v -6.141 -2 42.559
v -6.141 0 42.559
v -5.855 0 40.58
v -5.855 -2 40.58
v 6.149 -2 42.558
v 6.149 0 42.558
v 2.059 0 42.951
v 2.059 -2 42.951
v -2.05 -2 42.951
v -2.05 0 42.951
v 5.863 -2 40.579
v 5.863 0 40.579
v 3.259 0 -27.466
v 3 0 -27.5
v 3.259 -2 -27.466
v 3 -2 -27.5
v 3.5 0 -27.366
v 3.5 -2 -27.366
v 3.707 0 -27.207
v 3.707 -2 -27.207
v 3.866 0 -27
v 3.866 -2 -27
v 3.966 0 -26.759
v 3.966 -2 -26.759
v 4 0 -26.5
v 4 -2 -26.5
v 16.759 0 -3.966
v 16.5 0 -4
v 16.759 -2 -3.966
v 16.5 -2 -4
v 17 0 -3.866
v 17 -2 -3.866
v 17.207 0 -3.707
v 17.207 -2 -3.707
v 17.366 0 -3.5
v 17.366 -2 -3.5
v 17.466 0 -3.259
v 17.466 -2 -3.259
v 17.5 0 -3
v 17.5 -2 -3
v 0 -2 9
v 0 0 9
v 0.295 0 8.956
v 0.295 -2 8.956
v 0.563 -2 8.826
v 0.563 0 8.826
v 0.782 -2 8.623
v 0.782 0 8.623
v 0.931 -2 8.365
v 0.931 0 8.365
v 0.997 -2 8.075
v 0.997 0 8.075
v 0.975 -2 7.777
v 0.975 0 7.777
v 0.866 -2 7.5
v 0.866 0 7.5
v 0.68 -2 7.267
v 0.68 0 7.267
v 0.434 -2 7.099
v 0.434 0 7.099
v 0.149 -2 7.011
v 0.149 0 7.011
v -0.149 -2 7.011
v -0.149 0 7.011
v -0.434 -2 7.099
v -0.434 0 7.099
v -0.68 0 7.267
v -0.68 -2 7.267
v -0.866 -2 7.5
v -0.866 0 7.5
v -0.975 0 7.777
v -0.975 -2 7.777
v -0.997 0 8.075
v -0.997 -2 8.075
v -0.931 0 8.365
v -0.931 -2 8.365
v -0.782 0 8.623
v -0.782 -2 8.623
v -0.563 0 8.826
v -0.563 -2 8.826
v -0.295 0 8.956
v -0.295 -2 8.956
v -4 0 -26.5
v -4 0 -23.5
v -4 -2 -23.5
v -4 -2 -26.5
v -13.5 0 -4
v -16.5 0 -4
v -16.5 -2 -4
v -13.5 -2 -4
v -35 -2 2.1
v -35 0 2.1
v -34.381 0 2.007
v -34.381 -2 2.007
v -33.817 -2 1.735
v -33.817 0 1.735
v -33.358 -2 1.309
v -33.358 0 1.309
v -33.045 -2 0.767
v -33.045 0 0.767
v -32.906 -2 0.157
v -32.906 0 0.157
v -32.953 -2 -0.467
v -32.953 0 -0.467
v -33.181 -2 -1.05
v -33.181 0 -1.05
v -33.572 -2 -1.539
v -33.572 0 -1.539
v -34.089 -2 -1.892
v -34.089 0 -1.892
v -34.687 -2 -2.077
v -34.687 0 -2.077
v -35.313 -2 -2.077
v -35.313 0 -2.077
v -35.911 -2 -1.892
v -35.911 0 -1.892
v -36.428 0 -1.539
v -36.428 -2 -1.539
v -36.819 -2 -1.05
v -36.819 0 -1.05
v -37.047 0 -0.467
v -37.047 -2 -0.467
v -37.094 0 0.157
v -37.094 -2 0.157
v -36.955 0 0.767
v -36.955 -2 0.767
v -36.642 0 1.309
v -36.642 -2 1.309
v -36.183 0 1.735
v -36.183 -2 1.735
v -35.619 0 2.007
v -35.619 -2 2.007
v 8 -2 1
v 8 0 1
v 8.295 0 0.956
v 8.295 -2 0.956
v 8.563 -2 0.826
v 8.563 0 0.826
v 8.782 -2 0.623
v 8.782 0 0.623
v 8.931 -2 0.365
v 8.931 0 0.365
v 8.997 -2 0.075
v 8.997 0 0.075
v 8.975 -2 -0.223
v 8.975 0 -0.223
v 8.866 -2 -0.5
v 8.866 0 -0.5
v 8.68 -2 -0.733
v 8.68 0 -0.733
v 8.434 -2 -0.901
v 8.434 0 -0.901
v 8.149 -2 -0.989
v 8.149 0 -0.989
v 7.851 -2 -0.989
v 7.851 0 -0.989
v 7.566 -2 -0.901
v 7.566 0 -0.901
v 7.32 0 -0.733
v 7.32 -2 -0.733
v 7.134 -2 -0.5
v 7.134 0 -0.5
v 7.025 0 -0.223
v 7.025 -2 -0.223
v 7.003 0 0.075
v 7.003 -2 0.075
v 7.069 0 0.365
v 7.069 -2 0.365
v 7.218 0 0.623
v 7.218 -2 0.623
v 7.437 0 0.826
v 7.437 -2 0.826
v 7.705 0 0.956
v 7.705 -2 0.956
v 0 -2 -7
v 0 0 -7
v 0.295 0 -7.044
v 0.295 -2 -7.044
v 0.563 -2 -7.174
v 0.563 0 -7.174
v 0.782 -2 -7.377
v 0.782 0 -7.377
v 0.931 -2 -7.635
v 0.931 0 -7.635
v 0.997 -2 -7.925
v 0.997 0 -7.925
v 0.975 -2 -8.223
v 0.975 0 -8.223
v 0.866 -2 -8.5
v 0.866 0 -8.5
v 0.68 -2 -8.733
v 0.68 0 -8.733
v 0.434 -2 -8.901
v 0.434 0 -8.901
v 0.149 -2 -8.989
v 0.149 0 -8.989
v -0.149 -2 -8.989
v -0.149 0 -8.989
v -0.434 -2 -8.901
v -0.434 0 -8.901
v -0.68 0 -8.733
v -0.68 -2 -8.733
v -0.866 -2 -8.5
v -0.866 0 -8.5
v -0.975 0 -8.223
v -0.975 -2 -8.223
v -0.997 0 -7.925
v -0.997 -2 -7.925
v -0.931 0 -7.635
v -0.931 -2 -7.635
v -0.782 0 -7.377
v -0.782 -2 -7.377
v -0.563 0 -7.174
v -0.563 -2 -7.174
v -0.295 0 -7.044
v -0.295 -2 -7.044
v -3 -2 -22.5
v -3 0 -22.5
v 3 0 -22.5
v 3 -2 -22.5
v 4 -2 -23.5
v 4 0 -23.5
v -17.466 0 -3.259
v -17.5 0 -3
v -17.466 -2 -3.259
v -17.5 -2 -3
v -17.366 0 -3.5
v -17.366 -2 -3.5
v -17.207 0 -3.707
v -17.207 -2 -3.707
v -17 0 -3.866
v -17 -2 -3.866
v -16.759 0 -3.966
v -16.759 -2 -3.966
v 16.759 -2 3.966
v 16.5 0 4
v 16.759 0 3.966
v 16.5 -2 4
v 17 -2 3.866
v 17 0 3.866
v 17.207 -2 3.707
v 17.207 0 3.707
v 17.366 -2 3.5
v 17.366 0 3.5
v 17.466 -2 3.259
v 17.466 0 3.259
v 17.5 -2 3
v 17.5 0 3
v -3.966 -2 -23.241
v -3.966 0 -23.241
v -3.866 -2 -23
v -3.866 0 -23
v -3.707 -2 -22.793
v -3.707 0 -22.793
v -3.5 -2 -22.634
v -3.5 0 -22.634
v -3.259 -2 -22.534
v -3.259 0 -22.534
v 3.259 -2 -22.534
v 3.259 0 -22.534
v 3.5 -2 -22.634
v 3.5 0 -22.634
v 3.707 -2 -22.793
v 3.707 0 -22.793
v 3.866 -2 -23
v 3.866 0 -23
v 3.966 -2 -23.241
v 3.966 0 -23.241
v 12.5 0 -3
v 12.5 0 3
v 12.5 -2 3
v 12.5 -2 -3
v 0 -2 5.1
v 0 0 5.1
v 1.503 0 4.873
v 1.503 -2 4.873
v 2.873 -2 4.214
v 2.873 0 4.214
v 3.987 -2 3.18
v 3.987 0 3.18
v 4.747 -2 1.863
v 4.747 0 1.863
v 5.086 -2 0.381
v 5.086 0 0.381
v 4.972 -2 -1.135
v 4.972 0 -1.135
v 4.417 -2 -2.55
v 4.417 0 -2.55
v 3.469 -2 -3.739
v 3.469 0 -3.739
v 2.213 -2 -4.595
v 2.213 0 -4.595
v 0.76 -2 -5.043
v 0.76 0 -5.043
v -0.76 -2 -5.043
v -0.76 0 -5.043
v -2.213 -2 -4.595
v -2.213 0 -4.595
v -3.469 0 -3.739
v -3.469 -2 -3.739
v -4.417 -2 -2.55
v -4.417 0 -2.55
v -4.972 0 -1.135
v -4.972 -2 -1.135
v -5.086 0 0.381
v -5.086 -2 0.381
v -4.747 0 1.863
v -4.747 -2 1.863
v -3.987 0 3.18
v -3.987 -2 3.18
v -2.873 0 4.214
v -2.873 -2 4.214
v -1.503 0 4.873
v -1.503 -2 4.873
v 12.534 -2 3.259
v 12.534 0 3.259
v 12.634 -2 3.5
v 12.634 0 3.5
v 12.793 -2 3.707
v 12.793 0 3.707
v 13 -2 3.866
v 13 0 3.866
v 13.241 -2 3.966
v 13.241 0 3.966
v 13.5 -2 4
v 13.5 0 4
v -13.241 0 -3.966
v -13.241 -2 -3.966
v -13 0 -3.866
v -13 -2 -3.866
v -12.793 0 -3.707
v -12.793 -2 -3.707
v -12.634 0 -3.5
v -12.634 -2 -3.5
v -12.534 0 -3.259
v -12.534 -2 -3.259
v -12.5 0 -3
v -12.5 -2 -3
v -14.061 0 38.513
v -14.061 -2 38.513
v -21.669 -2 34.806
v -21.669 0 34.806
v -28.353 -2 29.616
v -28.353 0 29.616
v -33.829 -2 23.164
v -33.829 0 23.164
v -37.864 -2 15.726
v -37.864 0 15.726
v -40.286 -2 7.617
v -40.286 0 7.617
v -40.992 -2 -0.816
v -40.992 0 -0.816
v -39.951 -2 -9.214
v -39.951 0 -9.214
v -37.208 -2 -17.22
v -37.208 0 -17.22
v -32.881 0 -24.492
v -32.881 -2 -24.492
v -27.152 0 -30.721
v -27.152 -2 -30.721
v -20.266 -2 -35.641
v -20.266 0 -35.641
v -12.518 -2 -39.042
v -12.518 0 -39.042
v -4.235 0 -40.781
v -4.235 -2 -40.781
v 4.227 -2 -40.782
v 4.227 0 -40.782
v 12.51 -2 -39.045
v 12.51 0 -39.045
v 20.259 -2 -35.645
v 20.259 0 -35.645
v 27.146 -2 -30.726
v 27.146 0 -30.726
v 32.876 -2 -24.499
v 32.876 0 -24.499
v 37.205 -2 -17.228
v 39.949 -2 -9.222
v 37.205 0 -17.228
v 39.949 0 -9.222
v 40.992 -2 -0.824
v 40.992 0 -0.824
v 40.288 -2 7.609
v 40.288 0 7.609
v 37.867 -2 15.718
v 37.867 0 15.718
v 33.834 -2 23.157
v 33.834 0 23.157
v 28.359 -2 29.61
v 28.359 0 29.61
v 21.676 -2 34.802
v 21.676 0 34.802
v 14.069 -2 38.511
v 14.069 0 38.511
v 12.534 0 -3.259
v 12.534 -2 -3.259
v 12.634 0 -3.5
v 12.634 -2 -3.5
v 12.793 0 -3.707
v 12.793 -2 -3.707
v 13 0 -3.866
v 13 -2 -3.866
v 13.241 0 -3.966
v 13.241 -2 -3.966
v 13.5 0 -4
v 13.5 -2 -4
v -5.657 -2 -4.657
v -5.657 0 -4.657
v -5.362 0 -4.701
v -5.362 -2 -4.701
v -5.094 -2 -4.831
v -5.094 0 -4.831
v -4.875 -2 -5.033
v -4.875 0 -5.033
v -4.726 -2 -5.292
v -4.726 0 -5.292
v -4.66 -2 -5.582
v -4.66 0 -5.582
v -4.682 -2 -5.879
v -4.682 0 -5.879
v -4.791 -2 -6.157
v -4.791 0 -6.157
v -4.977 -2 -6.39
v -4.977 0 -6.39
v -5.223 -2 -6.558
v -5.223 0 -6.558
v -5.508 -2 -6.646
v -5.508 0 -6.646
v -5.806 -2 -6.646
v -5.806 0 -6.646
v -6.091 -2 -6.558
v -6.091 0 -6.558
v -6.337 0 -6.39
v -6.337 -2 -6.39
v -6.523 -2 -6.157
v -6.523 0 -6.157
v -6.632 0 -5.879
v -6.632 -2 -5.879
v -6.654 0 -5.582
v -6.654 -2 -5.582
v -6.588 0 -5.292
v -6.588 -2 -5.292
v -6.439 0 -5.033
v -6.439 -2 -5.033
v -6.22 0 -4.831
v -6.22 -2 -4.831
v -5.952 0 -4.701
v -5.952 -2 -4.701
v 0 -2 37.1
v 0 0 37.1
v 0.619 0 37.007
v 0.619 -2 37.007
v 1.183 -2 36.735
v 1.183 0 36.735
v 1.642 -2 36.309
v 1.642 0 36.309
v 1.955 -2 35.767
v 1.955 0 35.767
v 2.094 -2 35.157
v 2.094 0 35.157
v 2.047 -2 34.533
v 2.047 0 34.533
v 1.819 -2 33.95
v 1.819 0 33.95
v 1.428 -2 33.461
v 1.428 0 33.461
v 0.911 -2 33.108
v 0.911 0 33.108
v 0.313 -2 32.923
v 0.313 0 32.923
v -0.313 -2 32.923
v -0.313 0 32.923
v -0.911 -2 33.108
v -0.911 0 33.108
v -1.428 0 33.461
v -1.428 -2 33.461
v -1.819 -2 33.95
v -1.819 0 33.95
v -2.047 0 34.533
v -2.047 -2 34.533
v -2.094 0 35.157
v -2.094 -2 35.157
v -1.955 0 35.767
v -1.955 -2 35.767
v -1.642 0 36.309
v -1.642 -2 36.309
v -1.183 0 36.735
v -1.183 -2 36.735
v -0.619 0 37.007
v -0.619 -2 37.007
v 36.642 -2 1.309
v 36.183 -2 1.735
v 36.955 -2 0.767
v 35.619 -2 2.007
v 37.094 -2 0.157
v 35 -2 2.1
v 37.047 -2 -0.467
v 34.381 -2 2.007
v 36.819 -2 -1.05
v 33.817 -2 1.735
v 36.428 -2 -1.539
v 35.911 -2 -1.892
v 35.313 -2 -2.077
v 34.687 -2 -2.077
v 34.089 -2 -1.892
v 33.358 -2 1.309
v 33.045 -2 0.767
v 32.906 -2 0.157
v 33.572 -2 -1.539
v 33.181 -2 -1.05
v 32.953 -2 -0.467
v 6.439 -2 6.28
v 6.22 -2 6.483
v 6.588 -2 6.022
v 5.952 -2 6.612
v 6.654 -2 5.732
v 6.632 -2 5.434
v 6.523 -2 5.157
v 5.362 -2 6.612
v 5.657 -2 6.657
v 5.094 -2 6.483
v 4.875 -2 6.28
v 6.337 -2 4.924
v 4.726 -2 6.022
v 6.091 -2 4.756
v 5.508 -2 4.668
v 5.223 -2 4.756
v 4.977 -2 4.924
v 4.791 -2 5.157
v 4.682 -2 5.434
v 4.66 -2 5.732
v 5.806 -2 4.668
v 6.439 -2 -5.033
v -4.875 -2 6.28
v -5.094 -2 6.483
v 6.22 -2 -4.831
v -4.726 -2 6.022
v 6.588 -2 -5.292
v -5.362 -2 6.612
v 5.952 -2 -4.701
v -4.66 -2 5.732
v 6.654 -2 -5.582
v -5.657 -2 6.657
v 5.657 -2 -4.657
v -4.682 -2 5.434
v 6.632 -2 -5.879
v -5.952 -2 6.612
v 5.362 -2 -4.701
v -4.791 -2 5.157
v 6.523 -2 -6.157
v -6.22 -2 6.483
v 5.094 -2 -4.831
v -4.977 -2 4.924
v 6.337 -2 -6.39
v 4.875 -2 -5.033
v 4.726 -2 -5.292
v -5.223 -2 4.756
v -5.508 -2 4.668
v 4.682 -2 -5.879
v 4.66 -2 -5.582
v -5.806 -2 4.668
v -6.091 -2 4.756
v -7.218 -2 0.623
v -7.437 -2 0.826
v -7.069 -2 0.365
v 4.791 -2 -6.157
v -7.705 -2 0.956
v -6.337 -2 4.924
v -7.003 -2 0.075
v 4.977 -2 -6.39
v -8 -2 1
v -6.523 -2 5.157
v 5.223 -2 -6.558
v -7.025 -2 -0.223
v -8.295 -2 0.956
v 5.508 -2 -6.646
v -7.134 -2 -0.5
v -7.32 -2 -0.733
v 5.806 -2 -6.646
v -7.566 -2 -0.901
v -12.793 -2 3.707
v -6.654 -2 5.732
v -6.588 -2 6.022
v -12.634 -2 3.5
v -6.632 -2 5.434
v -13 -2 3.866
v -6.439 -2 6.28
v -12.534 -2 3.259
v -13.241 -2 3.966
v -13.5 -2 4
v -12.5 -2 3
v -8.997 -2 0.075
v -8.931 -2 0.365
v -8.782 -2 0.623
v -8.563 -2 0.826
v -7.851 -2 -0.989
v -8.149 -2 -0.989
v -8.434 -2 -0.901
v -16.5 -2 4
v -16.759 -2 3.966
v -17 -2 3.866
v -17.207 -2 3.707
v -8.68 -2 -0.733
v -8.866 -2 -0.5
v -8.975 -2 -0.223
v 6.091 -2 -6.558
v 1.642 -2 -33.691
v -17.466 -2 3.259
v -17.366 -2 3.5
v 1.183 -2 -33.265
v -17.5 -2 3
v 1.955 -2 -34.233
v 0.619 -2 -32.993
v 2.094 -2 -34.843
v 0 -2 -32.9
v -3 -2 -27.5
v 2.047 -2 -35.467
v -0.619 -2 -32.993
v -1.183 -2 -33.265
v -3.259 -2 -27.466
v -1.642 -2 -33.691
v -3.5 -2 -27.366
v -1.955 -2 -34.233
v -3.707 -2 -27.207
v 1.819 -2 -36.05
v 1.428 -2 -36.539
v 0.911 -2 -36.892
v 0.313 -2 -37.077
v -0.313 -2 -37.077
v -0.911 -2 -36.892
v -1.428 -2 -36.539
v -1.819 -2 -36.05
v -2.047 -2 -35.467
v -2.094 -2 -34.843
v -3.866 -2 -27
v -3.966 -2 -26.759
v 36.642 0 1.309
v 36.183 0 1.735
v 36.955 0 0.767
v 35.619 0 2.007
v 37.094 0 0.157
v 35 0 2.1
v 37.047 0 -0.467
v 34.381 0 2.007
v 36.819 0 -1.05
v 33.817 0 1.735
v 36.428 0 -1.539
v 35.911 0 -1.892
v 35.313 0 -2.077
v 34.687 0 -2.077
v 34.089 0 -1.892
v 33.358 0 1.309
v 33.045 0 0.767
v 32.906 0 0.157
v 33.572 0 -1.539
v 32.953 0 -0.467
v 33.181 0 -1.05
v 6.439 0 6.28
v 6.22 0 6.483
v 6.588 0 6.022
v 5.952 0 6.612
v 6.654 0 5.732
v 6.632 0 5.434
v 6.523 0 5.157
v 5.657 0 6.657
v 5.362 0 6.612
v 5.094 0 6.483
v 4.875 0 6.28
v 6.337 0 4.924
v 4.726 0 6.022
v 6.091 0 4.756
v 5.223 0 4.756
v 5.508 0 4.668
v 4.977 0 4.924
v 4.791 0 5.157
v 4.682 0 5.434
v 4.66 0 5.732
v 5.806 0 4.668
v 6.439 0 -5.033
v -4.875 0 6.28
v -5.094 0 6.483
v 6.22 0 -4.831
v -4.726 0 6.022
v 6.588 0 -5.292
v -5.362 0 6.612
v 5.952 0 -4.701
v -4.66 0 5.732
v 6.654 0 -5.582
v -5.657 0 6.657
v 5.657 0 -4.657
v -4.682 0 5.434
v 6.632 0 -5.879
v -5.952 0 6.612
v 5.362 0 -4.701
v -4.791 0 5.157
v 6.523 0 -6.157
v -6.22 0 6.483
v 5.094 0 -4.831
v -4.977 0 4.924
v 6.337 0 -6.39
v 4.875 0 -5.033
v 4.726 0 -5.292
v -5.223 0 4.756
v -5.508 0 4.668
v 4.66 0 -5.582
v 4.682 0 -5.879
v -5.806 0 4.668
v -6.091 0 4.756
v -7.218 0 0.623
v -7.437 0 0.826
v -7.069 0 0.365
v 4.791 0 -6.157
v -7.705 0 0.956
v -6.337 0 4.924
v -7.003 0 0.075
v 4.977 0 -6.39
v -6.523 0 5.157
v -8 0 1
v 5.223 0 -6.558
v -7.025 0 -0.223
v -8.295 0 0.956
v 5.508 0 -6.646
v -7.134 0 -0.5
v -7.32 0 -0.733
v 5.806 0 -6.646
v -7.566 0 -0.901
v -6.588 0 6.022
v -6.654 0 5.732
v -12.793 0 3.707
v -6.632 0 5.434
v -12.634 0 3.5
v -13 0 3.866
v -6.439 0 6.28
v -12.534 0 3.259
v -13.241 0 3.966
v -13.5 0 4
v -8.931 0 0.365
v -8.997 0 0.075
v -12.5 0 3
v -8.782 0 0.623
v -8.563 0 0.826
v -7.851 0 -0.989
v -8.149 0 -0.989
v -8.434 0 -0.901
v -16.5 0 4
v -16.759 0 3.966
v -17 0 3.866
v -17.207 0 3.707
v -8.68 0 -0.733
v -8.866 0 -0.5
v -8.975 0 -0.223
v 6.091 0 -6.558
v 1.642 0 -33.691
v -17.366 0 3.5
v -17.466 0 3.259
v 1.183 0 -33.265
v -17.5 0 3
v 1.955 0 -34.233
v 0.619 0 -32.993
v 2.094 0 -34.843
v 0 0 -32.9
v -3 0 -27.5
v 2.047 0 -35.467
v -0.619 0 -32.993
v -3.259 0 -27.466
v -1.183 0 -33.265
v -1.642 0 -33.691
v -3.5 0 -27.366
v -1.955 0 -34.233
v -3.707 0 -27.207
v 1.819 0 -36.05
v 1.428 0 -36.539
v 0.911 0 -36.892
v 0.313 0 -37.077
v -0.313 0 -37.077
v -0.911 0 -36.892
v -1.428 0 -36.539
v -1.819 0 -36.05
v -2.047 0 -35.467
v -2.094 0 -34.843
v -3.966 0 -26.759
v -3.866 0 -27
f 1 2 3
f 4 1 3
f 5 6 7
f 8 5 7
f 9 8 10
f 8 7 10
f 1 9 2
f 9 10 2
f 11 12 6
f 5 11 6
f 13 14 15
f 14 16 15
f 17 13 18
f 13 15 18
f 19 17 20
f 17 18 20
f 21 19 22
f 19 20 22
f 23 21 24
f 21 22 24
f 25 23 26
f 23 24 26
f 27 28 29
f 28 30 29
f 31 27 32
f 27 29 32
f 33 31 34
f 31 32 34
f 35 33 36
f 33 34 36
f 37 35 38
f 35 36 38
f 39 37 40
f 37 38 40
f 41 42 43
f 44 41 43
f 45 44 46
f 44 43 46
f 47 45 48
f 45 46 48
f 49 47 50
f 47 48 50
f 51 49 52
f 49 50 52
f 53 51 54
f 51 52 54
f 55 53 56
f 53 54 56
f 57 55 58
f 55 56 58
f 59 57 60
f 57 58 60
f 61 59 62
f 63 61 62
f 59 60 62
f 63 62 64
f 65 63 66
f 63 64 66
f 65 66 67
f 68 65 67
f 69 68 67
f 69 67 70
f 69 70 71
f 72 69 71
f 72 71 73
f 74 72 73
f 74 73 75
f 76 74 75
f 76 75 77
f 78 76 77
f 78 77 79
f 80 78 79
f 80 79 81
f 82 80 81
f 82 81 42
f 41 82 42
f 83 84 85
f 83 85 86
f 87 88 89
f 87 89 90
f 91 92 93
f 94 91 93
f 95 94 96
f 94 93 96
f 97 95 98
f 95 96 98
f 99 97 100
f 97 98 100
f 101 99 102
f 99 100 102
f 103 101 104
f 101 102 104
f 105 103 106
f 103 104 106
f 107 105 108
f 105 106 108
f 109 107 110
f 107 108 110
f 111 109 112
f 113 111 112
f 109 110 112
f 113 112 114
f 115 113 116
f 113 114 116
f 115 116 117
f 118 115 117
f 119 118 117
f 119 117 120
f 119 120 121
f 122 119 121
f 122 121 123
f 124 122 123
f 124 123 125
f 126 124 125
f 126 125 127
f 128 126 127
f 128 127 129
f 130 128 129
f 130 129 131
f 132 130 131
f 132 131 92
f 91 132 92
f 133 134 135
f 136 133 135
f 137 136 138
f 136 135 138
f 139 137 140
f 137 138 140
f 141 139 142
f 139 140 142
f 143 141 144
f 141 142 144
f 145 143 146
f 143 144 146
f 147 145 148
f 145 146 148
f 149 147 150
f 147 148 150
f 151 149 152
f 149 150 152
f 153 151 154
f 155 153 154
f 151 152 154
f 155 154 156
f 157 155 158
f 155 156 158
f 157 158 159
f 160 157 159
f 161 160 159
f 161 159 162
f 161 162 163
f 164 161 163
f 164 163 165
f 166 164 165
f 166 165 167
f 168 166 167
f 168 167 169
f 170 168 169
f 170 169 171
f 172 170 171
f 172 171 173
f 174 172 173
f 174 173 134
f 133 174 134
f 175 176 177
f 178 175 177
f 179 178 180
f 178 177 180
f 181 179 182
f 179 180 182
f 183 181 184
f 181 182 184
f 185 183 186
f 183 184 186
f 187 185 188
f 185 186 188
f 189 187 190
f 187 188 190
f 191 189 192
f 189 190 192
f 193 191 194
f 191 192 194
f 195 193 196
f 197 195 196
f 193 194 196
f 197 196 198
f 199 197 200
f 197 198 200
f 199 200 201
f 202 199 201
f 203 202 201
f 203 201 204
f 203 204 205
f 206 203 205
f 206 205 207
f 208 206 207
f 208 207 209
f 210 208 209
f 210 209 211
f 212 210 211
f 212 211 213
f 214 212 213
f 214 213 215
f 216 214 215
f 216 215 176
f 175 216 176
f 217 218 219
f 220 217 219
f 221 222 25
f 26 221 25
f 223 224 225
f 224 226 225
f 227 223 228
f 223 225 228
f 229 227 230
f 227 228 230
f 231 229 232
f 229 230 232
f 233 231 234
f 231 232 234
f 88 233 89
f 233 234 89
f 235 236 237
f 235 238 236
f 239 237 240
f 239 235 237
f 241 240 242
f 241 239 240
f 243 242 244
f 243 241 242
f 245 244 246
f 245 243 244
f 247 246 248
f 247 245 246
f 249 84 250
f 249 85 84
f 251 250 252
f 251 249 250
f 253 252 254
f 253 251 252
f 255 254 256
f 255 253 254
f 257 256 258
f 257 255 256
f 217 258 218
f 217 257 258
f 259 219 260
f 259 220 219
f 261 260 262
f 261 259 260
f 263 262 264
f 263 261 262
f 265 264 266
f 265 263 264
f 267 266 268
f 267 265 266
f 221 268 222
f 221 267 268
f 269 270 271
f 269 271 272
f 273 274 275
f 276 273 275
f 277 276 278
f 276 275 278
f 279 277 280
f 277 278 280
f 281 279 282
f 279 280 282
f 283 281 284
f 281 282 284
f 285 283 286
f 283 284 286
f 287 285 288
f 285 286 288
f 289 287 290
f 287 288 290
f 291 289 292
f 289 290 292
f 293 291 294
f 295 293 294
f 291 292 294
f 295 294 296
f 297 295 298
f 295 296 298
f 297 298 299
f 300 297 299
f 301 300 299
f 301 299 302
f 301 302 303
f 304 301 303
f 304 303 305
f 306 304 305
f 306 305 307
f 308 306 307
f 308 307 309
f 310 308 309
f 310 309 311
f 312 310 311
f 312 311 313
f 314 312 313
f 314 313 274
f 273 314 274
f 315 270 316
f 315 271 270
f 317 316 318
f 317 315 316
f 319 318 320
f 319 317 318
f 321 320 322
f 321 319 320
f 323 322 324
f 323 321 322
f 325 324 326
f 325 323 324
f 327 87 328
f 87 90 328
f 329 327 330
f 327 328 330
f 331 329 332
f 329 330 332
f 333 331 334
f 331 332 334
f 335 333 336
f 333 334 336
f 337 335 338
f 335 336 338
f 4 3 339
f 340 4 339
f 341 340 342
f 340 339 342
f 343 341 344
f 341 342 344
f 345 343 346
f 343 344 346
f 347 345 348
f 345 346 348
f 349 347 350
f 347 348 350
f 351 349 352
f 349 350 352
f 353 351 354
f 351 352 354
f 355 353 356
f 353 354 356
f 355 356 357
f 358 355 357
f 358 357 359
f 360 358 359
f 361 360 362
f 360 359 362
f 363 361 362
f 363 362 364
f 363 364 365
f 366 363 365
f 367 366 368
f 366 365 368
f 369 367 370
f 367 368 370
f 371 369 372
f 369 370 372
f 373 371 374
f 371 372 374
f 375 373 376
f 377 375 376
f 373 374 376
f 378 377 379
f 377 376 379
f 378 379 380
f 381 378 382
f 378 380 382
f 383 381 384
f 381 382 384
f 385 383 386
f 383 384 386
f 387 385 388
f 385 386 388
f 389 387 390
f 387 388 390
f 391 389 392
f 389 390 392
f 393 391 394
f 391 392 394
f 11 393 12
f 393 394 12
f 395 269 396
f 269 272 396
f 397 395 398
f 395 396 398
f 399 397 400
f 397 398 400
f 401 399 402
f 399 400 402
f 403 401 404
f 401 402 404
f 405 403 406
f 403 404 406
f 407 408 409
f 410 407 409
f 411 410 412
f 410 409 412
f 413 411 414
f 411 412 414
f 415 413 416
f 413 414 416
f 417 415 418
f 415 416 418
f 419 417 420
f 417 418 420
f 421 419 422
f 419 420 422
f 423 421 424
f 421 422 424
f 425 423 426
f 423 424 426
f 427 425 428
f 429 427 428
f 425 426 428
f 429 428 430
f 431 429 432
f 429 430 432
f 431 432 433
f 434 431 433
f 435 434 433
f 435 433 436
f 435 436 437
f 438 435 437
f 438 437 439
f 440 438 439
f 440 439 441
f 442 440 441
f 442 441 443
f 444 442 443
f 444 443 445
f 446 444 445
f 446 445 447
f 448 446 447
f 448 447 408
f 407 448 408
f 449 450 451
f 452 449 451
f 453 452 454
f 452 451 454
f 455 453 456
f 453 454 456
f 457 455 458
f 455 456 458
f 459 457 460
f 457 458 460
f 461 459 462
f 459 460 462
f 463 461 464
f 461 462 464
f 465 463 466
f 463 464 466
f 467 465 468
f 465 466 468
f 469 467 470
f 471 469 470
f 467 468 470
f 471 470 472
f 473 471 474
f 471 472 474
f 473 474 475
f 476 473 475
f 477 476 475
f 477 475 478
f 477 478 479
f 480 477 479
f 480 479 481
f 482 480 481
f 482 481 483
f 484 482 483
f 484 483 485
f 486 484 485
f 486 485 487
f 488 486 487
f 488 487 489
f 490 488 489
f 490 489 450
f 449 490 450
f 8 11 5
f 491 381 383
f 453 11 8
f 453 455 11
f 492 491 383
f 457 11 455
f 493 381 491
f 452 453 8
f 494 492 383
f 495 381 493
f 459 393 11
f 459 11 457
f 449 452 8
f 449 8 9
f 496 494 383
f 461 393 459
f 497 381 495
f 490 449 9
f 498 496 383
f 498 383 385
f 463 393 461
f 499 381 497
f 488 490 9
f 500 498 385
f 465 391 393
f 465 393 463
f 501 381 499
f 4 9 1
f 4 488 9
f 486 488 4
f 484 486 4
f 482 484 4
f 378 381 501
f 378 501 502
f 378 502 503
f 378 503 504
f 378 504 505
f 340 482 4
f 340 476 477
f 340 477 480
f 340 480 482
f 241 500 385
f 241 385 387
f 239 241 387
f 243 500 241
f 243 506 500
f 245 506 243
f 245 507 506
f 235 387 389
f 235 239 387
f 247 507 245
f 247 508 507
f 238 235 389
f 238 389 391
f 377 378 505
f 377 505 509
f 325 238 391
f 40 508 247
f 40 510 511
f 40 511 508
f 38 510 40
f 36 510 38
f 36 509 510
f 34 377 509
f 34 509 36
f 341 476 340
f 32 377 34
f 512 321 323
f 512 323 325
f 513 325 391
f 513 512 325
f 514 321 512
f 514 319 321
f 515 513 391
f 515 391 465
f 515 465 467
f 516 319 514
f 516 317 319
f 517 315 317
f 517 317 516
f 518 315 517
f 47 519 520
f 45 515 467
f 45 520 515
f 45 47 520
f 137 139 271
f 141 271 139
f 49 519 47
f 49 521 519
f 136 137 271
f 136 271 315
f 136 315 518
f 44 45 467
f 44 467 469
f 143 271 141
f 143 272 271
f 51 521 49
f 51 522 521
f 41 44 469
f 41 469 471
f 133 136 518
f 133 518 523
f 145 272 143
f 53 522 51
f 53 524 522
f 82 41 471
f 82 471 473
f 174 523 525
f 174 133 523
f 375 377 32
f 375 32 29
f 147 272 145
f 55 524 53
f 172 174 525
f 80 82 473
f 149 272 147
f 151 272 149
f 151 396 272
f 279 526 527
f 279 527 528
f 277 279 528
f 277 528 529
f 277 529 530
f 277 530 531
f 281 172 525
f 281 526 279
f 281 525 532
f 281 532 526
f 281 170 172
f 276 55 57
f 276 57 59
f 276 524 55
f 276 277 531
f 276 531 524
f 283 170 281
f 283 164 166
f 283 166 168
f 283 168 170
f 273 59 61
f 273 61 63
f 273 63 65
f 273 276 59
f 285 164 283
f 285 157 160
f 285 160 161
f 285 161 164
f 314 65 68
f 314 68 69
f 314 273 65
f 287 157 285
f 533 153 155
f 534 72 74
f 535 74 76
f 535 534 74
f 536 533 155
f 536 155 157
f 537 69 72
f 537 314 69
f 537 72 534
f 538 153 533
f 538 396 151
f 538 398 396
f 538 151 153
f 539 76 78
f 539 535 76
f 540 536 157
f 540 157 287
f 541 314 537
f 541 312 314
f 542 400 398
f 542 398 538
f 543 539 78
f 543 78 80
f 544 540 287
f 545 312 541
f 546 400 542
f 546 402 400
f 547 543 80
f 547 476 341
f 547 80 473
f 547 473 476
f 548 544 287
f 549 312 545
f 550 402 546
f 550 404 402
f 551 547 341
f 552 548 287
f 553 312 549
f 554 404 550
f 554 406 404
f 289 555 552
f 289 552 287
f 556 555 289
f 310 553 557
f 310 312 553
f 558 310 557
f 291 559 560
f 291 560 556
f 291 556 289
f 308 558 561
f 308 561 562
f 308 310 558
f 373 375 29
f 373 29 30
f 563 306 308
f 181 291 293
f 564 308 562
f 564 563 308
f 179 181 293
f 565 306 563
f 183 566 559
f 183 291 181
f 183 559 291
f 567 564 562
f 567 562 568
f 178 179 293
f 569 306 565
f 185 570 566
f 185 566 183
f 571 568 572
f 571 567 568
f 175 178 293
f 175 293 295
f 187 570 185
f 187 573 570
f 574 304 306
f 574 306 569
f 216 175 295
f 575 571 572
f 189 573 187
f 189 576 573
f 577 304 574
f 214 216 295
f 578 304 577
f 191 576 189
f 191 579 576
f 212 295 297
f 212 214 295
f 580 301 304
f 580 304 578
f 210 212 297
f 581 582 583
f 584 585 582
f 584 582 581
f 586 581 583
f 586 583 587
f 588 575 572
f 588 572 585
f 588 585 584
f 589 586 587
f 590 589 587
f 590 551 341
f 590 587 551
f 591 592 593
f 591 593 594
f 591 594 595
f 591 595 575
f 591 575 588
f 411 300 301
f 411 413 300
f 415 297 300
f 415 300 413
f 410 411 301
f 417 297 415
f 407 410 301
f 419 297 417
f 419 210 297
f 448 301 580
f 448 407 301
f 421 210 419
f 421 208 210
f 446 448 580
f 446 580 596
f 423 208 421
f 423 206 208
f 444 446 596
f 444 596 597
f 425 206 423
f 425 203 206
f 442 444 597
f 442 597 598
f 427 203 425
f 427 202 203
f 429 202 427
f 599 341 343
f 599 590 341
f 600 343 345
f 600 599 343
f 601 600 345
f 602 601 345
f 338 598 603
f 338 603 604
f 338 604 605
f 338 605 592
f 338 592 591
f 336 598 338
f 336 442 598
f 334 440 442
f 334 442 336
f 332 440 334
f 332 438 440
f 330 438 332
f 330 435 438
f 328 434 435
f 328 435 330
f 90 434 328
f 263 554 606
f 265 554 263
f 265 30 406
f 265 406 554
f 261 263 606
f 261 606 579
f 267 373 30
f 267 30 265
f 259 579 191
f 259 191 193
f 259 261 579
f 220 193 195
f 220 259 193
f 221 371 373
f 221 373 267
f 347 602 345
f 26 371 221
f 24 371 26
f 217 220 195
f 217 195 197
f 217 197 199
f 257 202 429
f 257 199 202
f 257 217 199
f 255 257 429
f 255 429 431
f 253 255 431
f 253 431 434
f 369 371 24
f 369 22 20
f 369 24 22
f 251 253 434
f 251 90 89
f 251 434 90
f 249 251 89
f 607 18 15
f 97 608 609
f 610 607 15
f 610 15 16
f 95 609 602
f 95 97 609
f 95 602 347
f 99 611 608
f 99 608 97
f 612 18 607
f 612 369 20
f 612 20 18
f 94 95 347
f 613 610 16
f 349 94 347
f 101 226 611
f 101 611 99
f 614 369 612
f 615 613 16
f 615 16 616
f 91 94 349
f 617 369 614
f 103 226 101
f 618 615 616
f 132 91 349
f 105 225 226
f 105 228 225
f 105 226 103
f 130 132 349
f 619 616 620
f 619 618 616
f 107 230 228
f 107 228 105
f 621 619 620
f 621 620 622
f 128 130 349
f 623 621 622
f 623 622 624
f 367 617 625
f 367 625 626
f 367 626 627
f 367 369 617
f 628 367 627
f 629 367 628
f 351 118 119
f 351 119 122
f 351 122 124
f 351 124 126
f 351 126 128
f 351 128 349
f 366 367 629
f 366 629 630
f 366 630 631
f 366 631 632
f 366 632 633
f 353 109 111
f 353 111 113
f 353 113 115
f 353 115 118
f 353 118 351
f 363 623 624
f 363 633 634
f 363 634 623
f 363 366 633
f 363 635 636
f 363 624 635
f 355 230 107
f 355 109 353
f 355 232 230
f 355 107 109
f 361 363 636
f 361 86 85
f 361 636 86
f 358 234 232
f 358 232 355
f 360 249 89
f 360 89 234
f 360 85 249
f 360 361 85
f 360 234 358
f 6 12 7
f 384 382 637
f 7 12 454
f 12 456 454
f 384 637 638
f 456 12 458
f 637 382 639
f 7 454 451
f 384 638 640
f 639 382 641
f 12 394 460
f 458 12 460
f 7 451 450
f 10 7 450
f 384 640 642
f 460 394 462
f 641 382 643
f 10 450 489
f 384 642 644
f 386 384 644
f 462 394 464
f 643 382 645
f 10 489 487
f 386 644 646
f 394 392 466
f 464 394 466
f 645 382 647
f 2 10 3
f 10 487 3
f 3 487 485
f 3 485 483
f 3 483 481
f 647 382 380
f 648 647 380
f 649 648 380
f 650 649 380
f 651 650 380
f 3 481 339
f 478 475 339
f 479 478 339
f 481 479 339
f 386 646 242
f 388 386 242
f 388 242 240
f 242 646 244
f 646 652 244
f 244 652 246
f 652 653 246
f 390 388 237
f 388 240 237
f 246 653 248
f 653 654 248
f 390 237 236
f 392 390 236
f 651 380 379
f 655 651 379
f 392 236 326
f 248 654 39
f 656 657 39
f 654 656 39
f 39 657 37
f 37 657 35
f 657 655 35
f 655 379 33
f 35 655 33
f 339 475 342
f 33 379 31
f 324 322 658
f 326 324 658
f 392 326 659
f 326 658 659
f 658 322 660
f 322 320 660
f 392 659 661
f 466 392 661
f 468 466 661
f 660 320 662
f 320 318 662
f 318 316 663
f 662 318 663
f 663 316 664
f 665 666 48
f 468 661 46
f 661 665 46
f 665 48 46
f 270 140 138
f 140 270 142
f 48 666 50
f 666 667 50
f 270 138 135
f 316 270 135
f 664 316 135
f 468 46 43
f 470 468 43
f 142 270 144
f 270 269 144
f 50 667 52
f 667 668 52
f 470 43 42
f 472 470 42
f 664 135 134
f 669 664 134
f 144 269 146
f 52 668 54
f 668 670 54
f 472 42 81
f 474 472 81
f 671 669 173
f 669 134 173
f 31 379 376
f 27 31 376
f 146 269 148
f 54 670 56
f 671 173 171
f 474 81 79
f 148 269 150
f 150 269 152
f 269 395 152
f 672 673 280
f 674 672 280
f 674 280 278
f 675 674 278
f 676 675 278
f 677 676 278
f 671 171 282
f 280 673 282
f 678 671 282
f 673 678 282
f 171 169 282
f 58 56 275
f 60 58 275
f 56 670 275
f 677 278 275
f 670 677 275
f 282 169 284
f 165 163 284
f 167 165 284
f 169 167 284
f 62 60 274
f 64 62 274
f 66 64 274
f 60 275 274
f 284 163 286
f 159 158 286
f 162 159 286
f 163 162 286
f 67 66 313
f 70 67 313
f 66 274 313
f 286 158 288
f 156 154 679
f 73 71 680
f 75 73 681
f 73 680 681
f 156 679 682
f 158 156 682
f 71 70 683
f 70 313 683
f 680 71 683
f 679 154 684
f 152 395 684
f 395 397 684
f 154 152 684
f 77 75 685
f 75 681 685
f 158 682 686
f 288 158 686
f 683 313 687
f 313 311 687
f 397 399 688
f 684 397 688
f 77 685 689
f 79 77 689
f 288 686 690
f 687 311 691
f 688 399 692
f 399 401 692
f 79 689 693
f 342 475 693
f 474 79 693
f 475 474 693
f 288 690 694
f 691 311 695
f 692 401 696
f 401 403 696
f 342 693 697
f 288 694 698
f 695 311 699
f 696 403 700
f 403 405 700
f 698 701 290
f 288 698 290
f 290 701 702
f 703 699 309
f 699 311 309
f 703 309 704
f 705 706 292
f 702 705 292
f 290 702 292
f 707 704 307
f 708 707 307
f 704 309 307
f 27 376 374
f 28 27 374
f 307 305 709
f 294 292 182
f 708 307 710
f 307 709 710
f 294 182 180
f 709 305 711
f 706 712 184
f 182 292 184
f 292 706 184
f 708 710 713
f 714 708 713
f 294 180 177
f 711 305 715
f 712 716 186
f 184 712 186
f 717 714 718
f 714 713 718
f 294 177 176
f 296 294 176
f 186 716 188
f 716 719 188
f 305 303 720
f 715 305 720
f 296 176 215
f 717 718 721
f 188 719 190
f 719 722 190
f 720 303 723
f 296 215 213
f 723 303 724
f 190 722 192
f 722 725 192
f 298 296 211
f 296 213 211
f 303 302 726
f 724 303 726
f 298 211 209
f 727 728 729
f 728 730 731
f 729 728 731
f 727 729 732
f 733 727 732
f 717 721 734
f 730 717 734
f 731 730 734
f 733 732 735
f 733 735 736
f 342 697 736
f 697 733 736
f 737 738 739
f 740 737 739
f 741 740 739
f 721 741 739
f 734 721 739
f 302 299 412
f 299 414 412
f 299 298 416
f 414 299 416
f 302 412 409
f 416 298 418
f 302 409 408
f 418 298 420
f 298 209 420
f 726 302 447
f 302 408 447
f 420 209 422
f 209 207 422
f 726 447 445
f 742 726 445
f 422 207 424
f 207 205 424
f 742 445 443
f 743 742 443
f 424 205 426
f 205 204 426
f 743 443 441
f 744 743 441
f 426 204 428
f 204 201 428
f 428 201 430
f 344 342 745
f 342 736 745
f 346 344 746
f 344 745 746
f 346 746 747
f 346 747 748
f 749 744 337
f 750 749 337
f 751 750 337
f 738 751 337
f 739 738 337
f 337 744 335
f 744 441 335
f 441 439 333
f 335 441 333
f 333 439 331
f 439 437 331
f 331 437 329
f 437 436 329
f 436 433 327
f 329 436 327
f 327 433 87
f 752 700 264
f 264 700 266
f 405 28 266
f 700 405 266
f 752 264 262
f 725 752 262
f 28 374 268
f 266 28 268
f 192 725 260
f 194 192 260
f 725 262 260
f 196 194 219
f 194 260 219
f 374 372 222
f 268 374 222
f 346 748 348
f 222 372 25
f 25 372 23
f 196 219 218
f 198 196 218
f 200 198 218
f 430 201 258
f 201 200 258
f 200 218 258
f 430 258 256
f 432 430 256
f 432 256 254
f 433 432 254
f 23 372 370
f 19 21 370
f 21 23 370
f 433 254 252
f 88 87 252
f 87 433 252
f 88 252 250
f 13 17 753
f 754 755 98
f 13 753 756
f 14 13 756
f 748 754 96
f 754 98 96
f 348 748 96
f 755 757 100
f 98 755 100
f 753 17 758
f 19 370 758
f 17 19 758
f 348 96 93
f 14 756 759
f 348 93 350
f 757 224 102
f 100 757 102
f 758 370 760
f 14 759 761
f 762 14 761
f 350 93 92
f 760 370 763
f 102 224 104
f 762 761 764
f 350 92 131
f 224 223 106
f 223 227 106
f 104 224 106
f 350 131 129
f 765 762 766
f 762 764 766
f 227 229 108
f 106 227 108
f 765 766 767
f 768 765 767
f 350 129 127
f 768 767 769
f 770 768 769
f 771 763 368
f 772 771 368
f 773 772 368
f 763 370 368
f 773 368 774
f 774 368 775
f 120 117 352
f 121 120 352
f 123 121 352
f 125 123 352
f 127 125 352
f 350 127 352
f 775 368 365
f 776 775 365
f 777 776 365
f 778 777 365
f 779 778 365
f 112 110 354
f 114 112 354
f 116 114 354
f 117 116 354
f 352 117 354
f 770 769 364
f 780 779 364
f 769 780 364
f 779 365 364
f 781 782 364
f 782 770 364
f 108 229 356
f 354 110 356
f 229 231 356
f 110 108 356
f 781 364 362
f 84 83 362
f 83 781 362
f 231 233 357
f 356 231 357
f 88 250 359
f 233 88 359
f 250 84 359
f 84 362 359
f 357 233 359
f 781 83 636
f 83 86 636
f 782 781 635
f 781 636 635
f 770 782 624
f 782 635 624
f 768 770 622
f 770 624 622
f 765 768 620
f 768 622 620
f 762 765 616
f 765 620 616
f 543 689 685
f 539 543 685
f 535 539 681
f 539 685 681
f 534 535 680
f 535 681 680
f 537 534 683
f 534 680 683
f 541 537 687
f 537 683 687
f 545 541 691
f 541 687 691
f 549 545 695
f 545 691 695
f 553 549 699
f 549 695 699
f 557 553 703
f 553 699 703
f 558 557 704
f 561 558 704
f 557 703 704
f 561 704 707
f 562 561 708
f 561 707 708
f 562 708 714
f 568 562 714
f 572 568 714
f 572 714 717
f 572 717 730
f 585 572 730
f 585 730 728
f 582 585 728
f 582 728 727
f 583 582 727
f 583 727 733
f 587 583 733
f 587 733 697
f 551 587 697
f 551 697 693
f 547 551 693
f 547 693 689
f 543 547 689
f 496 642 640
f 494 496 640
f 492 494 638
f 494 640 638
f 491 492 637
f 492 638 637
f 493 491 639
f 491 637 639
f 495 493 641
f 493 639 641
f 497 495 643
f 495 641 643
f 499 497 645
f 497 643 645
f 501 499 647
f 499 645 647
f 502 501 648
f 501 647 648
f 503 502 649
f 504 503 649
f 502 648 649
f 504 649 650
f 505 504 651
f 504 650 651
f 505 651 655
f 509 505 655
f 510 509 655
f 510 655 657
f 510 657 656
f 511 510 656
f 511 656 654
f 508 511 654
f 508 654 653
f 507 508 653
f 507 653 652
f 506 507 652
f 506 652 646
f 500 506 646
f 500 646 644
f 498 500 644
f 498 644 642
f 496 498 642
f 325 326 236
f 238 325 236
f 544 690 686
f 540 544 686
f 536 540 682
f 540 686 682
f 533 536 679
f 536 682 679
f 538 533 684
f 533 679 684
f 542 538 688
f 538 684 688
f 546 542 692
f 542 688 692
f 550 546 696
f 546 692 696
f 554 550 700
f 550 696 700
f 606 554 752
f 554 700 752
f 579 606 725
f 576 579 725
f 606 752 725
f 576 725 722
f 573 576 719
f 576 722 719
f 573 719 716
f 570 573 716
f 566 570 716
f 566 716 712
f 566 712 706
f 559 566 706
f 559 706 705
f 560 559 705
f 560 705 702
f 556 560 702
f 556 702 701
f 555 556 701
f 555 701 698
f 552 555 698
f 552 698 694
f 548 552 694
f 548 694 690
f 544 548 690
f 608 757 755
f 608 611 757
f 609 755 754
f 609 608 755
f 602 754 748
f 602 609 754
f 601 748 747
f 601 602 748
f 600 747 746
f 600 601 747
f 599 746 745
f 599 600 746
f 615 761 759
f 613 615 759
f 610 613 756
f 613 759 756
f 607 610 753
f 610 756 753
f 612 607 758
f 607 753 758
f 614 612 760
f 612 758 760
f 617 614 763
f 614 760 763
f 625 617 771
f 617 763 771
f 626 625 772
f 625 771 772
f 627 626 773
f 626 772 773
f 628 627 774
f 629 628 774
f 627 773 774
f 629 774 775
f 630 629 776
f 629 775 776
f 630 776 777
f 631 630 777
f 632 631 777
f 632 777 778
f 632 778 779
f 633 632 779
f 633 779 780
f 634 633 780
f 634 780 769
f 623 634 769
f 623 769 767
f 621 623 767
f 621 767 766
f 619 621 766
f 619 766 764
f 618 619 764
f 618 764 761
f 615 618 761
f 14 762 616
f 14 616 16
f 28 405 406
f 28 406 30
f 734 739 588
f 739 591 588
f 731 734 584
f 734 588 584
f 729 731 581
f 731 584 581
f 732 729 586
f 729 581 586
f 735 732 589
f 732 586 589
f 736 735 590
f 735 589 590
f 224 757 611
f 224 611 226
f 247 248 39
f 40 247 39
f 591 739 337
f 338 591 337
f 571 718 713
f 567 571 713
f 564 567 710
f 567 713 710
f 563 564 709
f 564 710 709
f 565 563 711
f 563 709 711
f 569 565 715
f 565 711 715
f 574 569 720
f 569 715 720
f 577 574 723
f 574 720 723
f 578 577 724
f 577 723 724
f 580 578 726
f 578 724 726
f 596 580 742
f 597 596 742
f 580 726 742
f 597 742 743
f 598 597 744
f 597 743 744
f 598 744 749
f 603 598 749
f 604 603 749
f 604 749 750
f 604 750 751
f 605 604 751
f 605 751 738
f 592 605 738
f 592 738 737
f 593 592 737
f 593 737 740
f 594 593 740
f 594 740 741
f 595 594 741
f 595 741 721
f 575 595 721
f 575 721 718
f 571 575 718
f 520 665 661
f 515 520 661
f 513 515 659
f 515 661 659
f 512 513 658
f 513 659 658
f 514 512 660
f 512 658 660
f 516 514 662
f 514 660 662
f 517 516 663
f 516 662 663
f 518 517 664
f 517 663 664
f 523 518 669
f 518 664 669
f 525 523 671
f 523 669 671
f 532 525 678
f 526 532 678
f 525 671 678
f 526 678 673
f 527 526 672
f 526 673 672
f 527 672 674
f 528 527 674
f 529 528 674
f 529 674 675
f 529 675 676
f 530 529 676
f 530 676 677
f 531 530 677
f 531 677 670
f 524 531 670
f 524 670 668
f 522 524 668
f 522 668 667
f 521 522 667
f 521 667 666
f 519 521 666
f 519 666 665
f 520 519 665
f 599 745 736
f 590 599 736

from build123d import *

# Parameters (mm, degrees)
SM_BASE_FLANGE_1_DEPTH = 2
CUT_EXTRUDE_1_REACH    = 61.447
SKETCH_6_R             = 2.1
SKETCH_6_R_2           = 5.1
SKETCH_6_R_3           = 1
SKETCH_6_W             = 8
SKETCH_6_H             = 5
SKETCH_6_W_2           = 5
SKETCH_6_H_2           = 8
FILLET_1_R             = 1


# Sheet-metal steps are written as plain solids
with BuildPart() as part:
    # Sketch 1 → 基体-法兰1 (new body)
    with BuildSketch(Plane(origin=(0, 0, 0), x_dir=(1, 0, 0), z_dir=(0, 1, 0))):
        with BuildLine():
            Line((-6.14057756, -42.559291667), (-5.854969301, -40.579789729))
            ThreePointArc((-5.854969301, -40.579789729), (-0.00413932, 40.999999791), (5.863162974, -40.578606678))
            Line((5.863162974, -40.578606678), (6.149170924, -42.558050906))
            ThreePointArc((6.149170924, -42.558050906), (0.004341238, -42.999999781), (-6.14057756, -42.559291667))
        make_face()
    extrude(amount=-SM_BASE_FLANGE_1_DEPTH)

    # 草图6 → 切除-拉伸1 (cut, up to next)
    with BuildSketch(Plane(origin=(0, 0, 0), x_dir=(1, 0, 0), z_dir=(0, 1, 0)), mode=Mode.PRIVATE) as cut_extrude_1_sk1:
        with Locations(Location((0, 35, 0), (0, 0, 270))):
            Circle(SKETCH_6_R)
    cut_extrude_1_tool1 = extrude(cut_extrude_1_sk1.sketch, amount=-CUT_EXTRUDE_1_REACH, mode=Mode.PRIVATE) & part.part
    # 草图6 → 切除-拉伸1 (cut, up to next)
    with BuildSketch(Plane(origin=(0, 0, 0), x_dir=(1, 0, 0), z_dir=(0, 1, 0)), mode=Mode.PRIVATE) as cut_extrude_1_sk2:
        with Locations(Location((35, 0, 0), (0, 0, 270))):
            Circle(SKETCH_6_R)
    cut_extrude_1_tool2 = extrude(cut_extrude_1_sk2.sketch, amount=-CUT_EXTRUDE_1_REACH, mode=Mode.PRIVATE) & part.part
    # 草图6 → 切除-拉伸1 (cut, up to next)
    with BuildSketch(Plane(origin=(0, 0, 0), x_dir=(1, 0, 0), z_dir=(0, 1, 0)), mode=Mode.PRIVATE) as cut_extrude_1_sk3:
        with Locations(Location((0, -35, 0), (0, 0, 270))):
            Circle(SKETCH_6_R)
    cut_extrude_1_tool3 = extrude(cut_extrude_1_sk3.sketch, amount=-CUT_EXTRUDE_1_REACH, mode=Mode.PRIVATE) & part.part
    # 草图6 → 切除-拉伸1 (cut, up to next)
    with BuildSketch(Plane(origin=(0, 0, 0), x_dir=(1, 0, 0), z_dir=(0, 1, 0)), mode=Mode.PRIVATE) as cut_extrude_1_sk4:
        with Locations(Location((-35, 0, 0), (0, 0, 270))):
            Circle(SKETCH_6_R)
    cut_extrude_1_tool4 = extrude(cut_extrude_1_sk4.sketch, amount=-CUT_EXTRUDE_1_REACH, mode=Mode.PRIVATE) & part.part
    # 草图6 → 切除-拉伸1 (cut, up to next)
    with BuildSketch(Plane(origin=(0, 0, 0), x_dir=(1, 0, 0), z_dir=(0, 1, 0)), mode=Mode.PRIVATE) as cut_extrude_1_sk5:
        with Locations(Location((0, 0, 0), (0, 0, 270))):
            Circle(SKETCH_6_R_2)
    cut_extrude_1_tool5 = extrude(cut_extrude_1_sk5.sketch, amount=-CUT_EXTRUDE_1_REACH, mode=Mode.PRIVATE) & part.part
    # 草图6 → 切除-拉伸1 (cut, up to next)
    with BuildSketch(Plane(origin=(0, 0, 0), x_dir=(1, 0, 0), z_dir=(0, 1, 0)), mode=Mode.PRIVATE) as cut_extrude_1_sk6:
        with Locations(Location((0, 8, 0), (0, 0, 270))):
            Circle(SKETCH_6_R_3)
    cut_extrude_1_tool6 = extrude(cut_extrude_1_sk6.sketch, amount=-CUT_EXTRUDE_1_REACH, mode=Mode.PRIVATE) & part.part
    # 草图6 → 切除-拉伸1 (cut, up to next)
    with BuildSketch(Plane(origin=(0, 0, 0), x_dir=(1, 0, 0), z_dir=(0, 1, 0)), mode=Mode.PRIVATE) as cut_extrude_1_sk7:
        with Locations(Location((5.656854249, 5.656854249, 0), (0, 0, 270))):
            Circle(SKETCH_6_R_3)
    cut_extrude_1_tool7 = extrude(cut_extrude_1_sk7.sketch, amount=-CUT_EXTRUDE_1_REACH, mode=Mode.PRIVATE) & part.part
    # 草图6 → 切除-拉伸1 (cut, up to next)
    with BuildSketch(Plane(origin=(0, 0, 0), x_dir=(1, 0, 0), z_dir=(0, 1, 0)), mode=Mode.PRIVATE) as cut_extrude_1_sk8:
        with Locations(Location((8, 0, 0), (0, 0, 270))):
            Circle(SKETCH_6_R_3)
    cut_extrude_1_tool8 = extrude(cut_extrude_1_sk8.sketch, amount=-CUT_EXTRUDE_1_REACH, mode=Mode.PRIVATE) & part.part
    # 草图6 → 切除-拉伸1 (cut, up to next)
    with BuildSketch(Plane(origin=(0, 0, 0), x_dir=(1, 0, 0), z_dir=(0, 1, 0)), mode=Mode.PRIVATE) as cut_extrude_1_sk9:
        with Locations(Location((5.656854249, -5.656854249, 0), (0, 0, 270))):
            Circle(SKETCH_6_R_3)
    cut_extrude_1_tool9 = extrude(cut_extrude_1_sk9.sketch, amount=-CUT_EXTRUDE_1_REACH, mode=Mode.PRIVATE) & part.part
    # 草图6 → 切除-拉伸1 (cut, up to next)
    with BuildSketch(Plane(origin=(0, 0, 0), x_dir=(1, 0, 0), z_dir=(0, 1, 0)), mode=Mode.PRIVATE) as cut_extrude_1_sk10:
        with Locations(Location((0, -8, 0), (0, 0, 270))):
            Circle(SKETCH_6_R_3)
    cut_extrude_1_tool10 = extrude(cut_extrude_1_sk10.sketch, amount=-CUT_EXTRUDE_1_REACH, mode=Mode.PRIVATE) & part.part
    # 草图6 → 切除-拉伸1 (cut, up to next)
    with BuildSketch(Plane(origin=(0, 0, 0), x_dir=(1, 0, 0), z_dir=(0, 1, 0)), mode=Mode.PRIVATE) as cut_extrude_1_sk11:
        with Locations(Location((-5.656854249, -5.656854249, 0), (0, 0, 270))):
            Circle(SKETCH_6_R_3)
    cut_extrude_1_tool11 = extrude(cut_extrude_1_sk11.sketch, amount=-CUT_EXTRUDE_1_REACH, mode=Mode.PRIVATE) & part.part
    # 草图6 → 切除-拉伸1 (cut, up to next)
    with BuildSketch(Plane(origin=(0, 0, 0), x_dir=(1, 0, 0), z_dir=(0, 1, 0)), mode=Mode.PRIVATE) as cut_extrude_1_sk12:
        with Locations(Location((-8, 0, 0), (0, 0, 270))):
            Circle(SKETCH_6_R_3)
    cut_extrude_1_tool12 = extrude(cut_extrude_1_sk12.sketch, amount=-CUT_EXTRUDE_1_REACH, mode=Mode.PRIVATE) & part.part
    # 草图6 → 切除-拉伸1 (cut, up to next)
    with BuildSketch(Plane(origin=(0, 0, 0), x_dir=(1, 0, 0), z_dir=(0, 1, 0)), mode=Mode.PRIVATE) as cut_extrude_1_sk13:
        with Locations(Location((-5.656854249, 5.656854249, 0), (0, 0, 270))):
            Circle(SKETCH_6_R_3)
    cut_extrude_1_tool13 = extrude(cut_extrude_1_sk13.sketch, amount=-CUT_EXTRUDE_1_REACH, mode=Mode.PRIVATE) & part.part
    # 草图6 → 切除-拉伸1 (cut, up to next)
    with BuildSketch(Plane(origin=(0, 0, 0), x_dir=(1, 0, 0), z_dir=(0, 1, 0)), mode=Mode.PRIVATE) as cut_extrude_1_sk14:
        with Locations((0, 25)):
            Rectangle(SKETCH_6_W, SKETCH_6_H)
    cut_extrude_1_tool14 = extrude(cut_extrude_1_sk14.sketch, amount=-CUT_EXTRUDE_1_REACH, mode=Mode.PRIVATE) & part.part
    # 草图6 → 切除-拉伸1 (cut, up to next)
    with BuildSketch(Plane(origin=(0, 0, 0), x_dir=(1, 0, 0), z_dir=(0, 1, 0)), mode=Mode.PRIVATE) as cut_extrude_1_sk15:
        with Locations((15, 0)):
            Rectangle(SKETCH_6_W_2, SKETCH_6_H_2)
    cut_extrude_1_tool15 = extrude(cut_extrude_1_sk15.sketch, amount=-CUT_EXTRUDE_1_REACH, mode=Mode.PRIVATE) & part.part
    # 草图6 → 切除-拉伸1 (cut, up to next)
    with BuildSketch(Plane(origin=(0, 0, 0), x_dir=(1, 0, 0), z_dir=(0, 1, 0)), mode=Mode.PRIVATE) as cut_extrude_1_sk16:
        with Locations((-15, 0)):
            Rectangle(SKETCH_6_W_2, SKETCH_6_H_2)
    cut_extrude_1_tool16 = extrude(cut_extrude_1_sk16.sketch, amount=-CUT_EXTRUDE_1_REACH, mode=Mode.PRIVATE) & part.part
    add(cut_extrude_1_tool1.solids().sort_by_distance((0, 0, -35))[0], mode=Mode.SUBTRACT)
    add(cut_extrude_1_tool2.solids().sort_by_distance((35, 0, 0))[0], mode=Mode.SUBTRACT)
    add(cut_extrude_1_tool3.solids().sort_by_distance((0, 0, 35))[0], mode=Mode.SUBTRACT)
    add(cut_extrude_1_tool4.solids().sort_by_distance((-35, 0, 0))[0], mode=Mode.SUBTRACT)
    add(cut_extrude_1_tool5.solids().sort_by_distance((0, 0, 0))[0], mode=Mode.SUBTRACT)
    add(cut_extrude_1_tool6.solids().sort_by_distance((0, 0, -8))[0], mode=Mode.SUBTRACT)
    add(cut_extrude_1_tool7.solids().sort_by_distance((5.656854, 0, -5.656854))[0], mode=Mode.SUBTRACT)
    add(cut_extrude_1_tool8.solids().sort_by_distance((8, 0, 0))[0], mode=Mode.SUBTRACT)
    add(cut_extrude_1_tool9.solids().sort_by_distance((5.656854, 0, 5.656854))[0], mode=Mode.SUBTRACT)
    add(cut_extrude_1_tool10.solids().sort_by_distance((0, 0, 8))[0], mode=Mode.SUBTRACT)
    add(cut_extrude_1_tool11.solids().sort_by_distance((-5.656854, 0, 5.656854))[0], mode=Mode.SUBTRACT)
    add(cut_extrude_1_tool12.solids().sort_by_distance((-8, 0, 0))[0], mode=Mode.SUBTRACT)
    add(cut_extrude_1_tool13.solids().sort_by_distance((-5.656854, 0, -5.656854))[0], mode=Mode.SUBTRACT)
    add(cut_extrude_1_tool14.solids().sort_by_distance((0, 0, -25))[0], mode=Mode.SUBTRACT)
    add(cut_extrude_1_tool15.solids().sort_by_distance((15, 0, 0))[0], mode=Mode.SUBTRACT)
    add(cut_extrude_1_tool16.solids().sort_by_distance((-15, 0, 0))[0], mode=Mode.SUBTRACT)

    # 圆角1
    fillet_1_edges = [part.edges().sort_by_distance(p)[0] for p in [
        (-17.5, -1, 4),
        (-17.5, -1, -4),
        (-12.5, -1, -4),
        (-12.5, -1, 4),
        (12.5, -1, 4),
        (12.5, -1, -4),
        (17.5, -1, -4),
        (17.5, -1, 4),
        (-4, -1, -22.5),
        (-4, -1, -27.5),
        (4, -1, -27.5),
        (4, -1, -22.5),
    ]]
    fillet(fillet_1_edges, radius=FILLET_1_R)


solid = part.part
